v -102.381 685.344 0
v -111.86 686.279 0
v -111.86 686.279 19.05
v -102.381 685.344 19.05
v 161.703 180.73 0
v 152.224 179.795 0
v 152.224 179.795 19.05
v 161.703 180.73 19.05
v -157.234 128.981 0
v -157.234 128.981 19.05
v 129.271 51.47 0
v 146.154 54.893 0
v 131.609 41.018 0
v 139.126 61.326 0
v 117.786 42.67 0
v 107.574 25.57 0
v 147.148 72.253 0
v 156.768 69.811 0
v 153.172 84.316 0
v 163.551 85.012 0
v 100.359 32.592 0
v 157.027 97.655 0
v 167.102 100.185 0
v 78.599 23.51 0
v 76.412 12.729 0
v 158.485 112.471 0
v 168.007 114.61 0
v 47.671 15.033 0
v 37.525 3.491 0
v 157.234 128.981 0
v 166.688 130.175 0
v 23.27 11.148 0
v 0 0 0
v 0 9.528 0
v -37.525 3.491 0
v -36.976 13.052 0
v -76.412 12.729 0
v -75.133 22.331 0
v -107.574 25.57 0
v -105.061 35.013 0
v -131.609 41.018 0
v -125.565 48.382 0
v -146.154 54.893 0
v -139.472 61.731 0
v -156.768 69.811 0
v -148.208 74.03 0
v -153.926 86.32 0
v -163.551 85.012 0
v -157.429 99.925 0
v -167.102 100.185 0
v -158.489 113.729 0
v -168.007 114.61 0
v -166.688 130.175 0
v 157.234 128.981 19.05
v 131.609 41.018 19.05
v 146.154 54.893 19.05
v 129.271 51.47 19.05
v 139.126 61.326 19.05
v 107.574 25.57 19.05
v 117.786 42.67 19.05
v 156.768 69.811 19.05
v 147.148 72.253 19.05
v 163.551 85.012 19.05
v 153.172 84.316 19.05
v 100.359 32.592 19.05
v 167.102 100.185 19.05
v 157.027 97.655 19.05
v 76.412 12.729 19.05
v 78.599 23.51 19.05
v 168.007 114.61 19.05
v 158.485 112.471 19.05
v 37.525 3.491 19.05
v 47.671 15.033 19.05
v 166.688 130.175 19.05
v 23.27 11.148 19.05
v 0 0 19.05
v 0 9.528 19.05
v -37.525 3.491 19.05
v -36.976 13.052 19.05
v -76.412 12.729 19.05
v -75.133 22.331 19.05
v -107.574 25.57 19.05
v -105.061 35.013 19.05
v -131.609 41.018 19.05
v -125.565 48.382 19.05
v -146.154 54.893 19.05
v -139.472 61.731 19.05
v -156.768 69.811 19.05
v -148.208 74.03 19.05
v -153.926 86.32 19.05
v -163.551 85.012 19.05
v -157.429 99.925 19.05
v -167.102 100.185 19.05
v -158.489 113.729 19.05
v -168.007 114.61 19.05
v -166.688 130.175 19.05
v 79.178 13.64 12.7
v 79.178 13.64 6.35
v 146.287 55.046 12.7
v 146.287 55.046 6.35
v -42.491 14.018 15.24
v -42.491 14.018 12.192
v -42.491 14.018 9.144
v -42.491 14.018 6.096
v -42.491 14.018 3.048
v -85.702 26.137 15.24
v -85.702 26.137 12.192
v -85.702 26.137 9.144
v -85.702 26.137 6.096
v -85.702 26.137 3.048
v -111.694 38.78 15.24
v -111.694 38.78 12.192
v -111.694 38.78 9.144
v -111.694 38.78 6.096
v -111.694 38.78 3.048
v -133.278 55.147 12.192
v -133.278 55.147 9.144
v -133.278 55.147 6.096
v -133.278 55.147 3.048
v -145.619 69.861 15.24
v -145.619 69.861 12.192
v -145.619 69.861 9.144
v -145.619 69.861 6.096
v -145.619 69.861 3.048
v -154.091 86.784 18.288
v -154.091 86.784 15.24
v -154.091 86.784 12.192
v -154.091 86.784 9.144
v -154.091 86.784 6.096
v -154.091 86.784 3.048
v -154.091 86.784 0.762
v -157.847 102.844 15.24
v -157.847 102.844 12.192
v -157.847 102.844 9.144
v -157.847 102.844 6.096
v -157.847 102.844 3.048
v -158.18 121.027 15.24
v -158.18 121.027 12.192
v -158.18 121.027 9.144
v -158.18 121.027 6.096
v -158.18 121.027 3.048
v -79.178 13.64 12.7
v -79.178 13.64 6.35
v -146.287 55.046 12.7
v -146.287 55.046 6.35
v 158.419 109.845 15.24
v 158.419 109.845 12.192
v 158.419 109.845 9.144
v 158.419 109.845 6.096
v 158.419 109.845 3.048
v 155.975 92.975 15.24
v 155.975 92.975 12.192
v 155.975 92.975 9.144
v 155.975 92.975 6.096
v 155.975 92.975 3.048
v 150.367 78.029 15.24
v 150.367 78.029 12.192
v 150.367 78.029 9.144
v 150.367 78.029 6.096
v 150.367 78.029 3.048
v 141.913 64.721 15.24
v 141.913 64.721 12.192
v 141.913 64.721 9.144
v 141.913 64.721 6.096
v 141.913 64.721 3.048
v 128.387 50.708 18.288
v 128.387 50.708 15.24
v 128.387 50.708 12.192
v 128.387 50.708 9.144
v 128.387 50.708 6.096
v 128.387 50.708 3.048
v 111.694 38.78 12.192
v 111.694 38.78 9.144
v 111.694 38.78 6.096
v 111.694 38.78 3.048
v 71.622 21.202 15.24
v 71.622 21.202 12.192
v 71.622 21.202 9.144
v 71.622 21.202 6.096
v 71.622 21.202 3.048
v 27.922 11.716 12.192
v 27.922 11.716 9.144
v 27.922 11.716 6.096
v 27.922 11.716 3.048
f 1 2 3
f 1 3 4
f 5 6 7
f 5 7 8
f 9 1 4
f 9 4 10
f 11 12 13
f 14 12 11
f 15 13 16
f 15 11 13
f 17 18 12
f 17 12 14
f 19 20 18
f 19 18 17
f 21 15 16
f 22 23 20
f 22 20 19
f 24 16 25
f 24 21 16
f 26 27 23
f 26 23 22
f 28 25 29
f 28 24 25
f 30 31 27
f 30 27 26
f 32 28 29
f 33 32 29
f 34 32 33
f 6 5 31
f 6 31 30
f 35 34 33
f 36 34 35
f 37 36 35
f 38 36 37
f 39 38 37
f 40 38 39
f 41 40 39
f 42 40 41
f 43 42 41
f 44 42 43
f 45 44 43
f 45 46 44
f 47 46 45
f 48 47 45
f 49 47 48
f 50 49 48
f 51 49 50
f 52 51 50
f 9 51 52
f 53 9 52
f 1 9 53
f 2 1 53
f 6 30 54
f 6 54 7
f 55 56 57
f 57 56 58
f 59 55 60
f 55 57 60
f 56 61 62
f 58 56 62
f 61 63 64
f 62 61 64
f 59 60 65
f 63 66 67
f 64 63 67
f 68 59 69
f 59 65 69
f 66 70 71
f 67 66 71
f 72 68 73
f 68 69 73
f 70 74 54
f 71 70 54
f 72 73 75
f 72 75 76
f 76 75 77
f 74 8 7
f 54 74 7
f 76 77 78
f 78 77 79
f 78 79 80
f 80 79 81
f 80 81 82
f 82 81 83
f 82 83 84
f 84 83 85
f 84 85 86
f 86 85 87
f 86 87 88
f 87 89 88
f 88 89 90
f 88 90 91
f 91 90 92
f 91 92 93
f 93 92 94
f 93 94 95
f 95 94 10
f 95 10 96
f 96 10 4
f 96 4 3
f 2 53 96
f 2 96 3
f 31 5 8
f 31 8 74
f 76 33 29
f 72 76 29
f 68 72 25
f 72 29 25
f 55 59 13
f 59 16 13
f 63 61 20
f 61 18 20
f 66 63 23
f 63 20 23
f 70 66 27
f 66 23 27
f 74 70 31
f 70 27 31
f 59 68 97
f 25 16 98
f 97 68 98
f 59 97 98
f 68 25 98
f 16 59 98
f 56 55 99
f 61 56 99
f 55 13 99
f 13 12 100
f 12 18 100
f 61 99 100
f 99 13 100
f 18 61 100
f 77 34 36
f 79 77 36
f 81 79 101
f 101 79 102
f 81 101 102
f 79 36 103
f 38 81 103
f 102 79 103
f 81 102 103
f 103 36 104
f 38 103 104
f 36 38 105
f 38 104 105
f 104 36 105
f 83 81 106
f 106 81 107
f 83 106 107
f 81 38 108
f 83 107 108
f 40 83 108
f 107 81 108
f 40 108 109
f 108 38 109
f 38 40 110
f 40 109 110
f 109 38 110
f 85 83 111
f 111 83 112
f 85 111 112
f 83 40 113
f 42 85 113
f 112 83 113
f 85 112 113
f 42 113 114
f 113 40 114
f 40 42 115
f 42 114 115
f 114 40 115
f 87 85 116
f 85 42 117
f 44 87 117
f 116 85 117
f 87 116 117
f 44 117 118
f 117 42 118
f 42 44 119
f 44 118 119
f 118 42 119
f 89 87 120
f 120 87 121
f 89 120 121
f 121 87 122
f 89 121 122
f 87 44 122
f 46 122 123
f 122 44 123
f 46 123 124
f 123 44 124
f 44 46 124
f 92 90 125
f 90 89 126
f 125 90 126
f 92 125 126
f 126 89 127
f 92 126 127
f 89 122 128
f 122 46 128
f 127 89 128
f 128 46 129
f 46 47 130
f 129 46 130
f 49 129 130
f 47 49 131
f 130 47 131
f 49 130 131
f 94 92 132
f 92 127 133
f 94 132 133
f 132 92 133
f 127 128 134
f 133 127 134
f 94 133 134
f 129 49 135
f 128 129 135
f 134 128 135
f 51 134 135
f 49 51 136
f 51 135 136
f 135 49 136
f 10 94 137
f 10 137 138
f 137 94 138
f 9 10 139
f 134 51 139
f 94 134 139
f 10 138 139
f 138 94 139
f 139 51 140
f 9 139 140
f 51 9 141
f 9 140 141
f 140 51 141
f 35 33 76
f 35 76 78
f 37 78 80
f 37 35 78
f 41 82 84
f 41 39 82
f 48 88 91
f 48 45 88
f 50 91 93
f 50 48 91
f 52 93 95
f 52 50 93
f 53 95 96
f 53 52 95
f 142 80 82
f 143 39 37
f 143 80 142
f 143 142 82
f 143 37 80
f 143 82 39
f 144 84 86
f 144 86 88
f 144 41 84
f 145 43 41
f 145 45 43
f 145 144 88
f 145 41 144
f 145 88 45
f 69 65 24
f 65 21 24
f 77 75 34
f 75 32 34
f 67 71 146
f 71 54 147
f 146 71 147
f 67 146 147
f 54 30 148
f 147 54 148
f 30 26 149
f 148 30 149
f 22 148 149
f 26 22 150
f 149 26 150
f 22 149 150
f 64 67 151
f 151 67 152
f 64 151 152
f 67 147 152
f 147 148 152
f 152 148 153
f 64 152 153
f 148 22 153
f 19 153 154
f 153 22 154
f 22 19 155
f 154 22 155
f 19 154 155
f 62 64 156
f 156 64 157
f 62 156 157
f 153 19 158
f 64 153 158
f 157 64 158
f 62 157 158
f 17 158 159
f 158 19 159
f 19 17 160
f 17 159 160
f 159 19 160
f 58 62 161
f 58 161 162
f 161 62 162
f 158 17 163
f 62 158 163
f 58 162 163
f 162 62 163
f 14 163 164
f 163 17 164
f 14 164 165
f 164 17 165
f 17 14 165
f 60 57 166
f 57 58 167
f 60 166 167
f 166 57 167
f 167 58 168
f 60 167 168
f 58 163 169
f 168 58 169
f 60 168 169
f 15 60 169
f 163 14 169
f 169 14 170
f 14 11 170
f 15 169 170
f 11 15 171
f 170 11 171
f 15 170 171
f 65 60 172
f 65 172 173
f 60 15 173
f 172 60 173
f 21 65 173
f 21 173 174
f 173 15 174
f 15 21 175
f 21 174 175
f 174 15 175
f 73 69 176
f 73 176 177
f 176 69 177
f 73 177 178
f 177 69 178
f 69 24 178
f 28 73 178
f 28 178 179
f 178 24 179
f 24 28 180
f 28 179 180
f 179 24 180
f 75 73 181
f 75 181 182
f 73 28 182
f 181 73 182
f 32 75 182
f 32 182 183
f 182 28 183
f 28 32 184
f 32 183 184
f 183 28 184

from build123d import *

# Parameters (mm, degrees)
BOSS_EXTRUDE1_DEPTH = 19.05


with BuildPart() as part:
    # Sketch1 → Boss-Extrude1 (new body)
    with BuildSketch(Plane.XY):
        with BuildLine():
            Line((157.234081882, 128.980548454), (152.224173193, 179.795336584))
            Line((152.224173193, 179.795336584), (161.70321507, 180.729890008))
            Line((161.70321507, 180.729890008), (166.6875, 130.175))
            add(Edge.make_bspline(
                [(0, 0), (73.666580622, 1.740675992), (181.188092361, 36.200835609), (166.6875, 130.175)],
                knots=[0, 0, 0, 0, 1, 1, 1, 1], degree=3))
            add(Edge.make_bspline(
                [(0, 0), (-73.666580622, 1.740675992), (-181.188092361, 36.200835609), (-166.6875, 130.175)],
                knots=[0, 0, 0, 0, 1, 1, 1, 1], degree=3))
            Line((-166.6875, 130.175), (-111.860365766, 686.278790089))
            Line((-111.860365766, 686.278790089), (-102.381323889, 685.344236665))
            Line((-102.381323889, 685.344236665), (-157.234081882, 128.980548454))
            add(Edge.make_bspline(
                [(0, 9.52776174), (-1.117611602, 9.555193192), (-3.340472897, 9.624755056), (-7.880039481, 9.827207732), (-13.652210416, 10.198958437), (-20.725459036, 10.840441372), (-30.303235723, 11.962316267), (-42.47749757, 13.875858033), (-57.165232888, 17.02314898), (-71.689613059, 21.050850851), (-90.515854195, 27.626537064), (-112.436111514, 38.157452487), (-130.643933928, 51.803557723), (-142.189146149, 64.564536934), (-149.192253507, 75.075537554), (-153.541361304, 84.674022673), (-156.058613173, 92.923629982), (-157.442658539, 99.418206789), (-158.29640922, 106.242287005), (-158.540175044, 112.221426054), (-158.437150466, 117.190167219), (-158.20642164, 121.010360535), (-157.881730698, 124.277278241), (-157.584058118, 126.601085874), (-157.415798733, 127.781927866), (-157.316566229, 128.446705395), (-157.261207353, 128.804756083), (-157.234081882, 128.980548454)],
                knots=[0.001057036, 0.001057036, 0.001057036, 0.001057036, 0.016679825, 0.032302613, 0.063548191, 0.094793768, 0.126039346, 0.1885305, 0.251021655, 0.31351281, 0.376003965, 0.500986274, 0.625968584, 0.688459739, 0.750950893, 0.813442048, 0.844687626, 0.875933203, 0.90717878, 0.938424358, 0.954047147, 0.969669935, 0.985292724, 0.993104118, 0.997009815, 0.998962664, 1.000915513, 1.000915513, 1.000915513, 1.000915513], degree=3))
            add(Edge.make_bspline(
                [(157.234081882, 128.980548454), (157.261207353, 128.804756083), (157.316566229, 128.446705395), (157.415798733, 127.781927866), (157.584058118, 126.601085874), (157.881730698, 124.277278241), (158.20642164, 121.010360535), (158.437150466, 117.190167219), (158.540175044, 112.221426054), (158.29640922, 106.242287005), (157.442658539, 99.418206789), (156.058613173, 92.923629982), (153.541361304, 84.674022673), (149.192253507, 75.075537554), (142.189146149, 64.564536934), (130.643933928, 51.803557723), (112.436111514, 38.157452487), (90.515854195, 27.626537064), (71.689613059, 21.050850851), (57.165232888, 17.02314898), (42.47749757, 13.875858033), (30.303235723, 11.962316267), (20.725459036, 10.840441372), (13.652210416, 10.198958437), (7.880039481, 9.827207732), (3.340472897, 9.624755056), (1.117611602, 9.555193192), (0, 9.52776174)],
                knots=[0.001057036, 0.001057036, 0.001057036, 0.001057036, 0.003009885, 0.004962733, 0.00886843, 0.016679825, 0.032302613, 0.047925402, 0.063548191, 0.094793768, 0.126039346, 0.157284923, 0.1885305, 0.251021655, 0.31351281, 0.376003965, 0.500986274, 0.625968584, 0.688459739, 0.750950893, 0.813442048, 0.875933203, 0.90717878, 0.938424358, 0.969669935, 0.985292724, 1.000915513, 1.000915513, 1.000915513, 1.000915513], degree=3))
        make_face()
    extrude(amount=BOSS_EXTRUDE1_DEPTH)


solid = part.part
